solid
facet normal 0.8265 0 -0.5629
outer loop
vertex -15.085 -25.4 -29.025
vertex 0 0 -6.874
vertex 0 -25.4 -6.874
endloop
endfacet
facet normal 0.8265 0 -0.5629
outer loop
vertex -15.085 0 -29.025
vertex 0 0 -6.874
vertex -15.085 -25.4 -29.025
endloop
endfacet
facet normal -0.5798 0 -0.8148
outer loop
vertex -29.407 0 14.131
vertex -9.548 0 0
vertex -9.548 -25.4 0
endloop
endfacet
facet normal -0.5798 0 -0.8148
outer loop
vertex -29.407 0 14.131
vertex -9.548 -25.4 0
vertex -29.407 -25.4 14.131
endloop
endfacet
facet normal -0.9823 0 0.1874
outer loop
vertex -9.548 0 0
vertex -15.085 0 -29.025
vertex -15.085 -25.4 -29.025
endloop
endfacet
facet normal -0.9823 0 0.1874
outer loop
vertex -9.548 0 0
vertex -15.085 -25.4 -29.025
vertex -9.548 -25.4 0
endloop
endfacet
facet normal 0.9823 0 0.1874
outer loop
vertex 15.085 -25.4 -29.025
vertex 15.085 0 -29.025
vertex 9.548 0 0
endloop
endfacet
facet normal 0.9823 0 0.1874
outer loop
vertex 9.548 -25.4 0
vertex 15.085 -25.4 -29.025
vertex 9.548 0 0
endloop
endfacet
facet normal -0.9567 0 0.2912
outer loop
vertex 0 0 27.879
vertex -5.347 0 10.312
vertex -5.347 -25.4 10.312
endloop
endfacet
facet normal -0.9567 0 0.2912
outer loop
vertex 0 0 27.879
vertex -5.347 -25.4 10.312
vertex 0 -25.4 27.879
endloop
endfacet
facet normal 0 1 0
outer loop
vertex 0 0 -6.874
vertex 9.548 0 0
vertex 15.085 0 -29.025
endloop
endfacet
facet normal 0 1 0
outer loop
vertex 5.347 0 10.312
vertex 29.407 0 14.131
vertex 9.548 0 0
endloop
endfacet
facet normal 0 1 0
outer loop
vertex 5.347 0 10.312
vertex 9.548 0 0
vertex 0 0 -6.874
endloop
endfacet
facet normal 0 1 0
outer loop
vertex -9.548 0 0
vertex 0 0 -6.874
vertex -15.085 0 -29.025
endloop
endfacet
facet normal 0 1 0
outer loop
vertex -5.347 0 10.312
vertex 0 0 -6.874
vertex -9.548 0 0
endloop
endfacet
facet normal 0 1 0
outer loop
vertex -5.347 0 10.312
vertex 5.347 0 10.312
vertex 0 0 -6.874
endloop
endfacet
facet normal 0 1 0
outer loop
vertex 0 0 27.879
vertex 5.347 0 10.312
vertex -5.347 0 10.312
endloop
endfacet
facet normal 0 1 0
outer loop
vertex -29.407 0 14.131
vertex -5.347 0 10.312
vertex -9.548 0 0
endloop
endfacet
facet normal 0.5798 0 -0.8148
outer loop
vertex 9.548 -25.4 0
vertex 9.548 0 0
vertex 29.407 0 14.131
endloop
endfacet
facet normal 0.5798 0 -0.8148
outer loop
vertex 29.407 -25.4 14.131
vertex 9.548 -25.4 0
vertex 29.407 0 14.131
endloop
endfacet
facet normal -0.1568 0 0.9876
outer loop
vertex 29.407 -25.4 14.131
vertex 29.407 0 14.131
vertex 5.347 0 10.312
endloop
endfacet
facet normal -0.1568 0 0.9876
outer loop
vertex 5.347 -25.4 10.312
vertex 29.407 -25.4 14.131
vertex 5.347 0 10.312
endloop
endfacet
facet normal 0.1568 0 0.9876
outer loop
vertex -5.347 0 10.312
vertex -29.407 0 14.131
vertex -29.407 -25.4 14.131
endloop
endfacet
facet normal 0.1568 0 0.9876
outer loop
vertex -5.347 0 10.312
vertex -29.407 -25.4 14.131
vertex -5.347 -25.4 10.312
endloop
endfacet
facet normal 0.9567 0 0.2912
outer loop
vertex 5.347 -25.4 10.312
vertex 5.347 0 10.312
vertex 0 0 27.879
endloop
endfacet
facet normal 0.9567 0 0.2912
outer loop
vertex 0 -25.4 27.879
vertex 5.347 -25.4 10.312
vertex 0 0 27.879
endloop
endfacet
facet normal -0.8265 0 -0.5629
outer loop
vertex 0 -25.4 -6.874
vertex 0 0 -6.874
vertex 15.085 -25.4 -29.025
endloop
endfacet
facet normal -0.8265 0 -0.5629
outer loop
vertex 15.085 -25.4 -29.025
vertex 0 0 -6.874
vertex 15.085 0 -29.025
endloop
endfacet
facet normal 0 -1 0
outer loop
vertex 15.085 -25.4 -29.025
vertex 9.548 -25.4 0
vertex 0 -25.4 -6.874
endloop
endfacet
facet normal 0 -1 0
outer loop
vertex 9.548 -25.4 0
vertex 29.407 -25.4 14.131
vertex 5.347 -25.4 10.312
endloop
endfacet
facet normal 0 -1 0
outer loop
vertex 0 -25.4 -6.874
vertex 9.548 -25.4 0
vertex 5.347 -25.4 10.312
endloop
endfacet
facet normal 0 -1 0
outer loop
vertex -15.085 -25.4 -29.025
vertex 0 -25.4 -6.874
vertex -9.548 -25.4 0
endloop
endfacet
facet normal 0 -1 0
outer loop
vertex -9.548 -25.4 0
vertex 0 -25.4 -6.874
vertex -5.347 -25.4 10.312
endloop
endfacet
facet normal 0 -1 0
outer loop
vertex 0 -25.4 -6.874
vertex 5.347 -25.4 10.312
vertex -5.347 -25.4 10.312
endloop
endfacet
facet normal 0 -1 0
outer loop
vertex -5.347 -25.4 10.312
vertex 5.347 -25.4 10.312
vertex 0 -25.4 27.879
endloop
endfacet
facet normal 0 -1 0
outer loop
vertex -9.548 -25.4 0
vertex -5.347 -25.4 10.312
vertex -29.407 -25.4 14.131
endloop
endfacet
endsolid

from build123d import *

# Parameters (mm, degrees)
F1_DEPTH = 25.4


with BuildPart() as f1:
    # F0 (on Front) → F1 (new body)
    with BuildSketch(Plane.XZ):
        Polygon((0, -6.874368), (15.085418, -29.025108), (9.547733, 0), (29.407017, 14.130645), (5.34673, 10.311551), (0, 27.87938), align=None)
    extrude(amount=F1_DEPTH)

    # F2: F1 across plane


with BuildPart() as f1_1:
    add(f1.part)
    add(f1.part.mirror(Plane.YZ))


solid = f1_1.part
